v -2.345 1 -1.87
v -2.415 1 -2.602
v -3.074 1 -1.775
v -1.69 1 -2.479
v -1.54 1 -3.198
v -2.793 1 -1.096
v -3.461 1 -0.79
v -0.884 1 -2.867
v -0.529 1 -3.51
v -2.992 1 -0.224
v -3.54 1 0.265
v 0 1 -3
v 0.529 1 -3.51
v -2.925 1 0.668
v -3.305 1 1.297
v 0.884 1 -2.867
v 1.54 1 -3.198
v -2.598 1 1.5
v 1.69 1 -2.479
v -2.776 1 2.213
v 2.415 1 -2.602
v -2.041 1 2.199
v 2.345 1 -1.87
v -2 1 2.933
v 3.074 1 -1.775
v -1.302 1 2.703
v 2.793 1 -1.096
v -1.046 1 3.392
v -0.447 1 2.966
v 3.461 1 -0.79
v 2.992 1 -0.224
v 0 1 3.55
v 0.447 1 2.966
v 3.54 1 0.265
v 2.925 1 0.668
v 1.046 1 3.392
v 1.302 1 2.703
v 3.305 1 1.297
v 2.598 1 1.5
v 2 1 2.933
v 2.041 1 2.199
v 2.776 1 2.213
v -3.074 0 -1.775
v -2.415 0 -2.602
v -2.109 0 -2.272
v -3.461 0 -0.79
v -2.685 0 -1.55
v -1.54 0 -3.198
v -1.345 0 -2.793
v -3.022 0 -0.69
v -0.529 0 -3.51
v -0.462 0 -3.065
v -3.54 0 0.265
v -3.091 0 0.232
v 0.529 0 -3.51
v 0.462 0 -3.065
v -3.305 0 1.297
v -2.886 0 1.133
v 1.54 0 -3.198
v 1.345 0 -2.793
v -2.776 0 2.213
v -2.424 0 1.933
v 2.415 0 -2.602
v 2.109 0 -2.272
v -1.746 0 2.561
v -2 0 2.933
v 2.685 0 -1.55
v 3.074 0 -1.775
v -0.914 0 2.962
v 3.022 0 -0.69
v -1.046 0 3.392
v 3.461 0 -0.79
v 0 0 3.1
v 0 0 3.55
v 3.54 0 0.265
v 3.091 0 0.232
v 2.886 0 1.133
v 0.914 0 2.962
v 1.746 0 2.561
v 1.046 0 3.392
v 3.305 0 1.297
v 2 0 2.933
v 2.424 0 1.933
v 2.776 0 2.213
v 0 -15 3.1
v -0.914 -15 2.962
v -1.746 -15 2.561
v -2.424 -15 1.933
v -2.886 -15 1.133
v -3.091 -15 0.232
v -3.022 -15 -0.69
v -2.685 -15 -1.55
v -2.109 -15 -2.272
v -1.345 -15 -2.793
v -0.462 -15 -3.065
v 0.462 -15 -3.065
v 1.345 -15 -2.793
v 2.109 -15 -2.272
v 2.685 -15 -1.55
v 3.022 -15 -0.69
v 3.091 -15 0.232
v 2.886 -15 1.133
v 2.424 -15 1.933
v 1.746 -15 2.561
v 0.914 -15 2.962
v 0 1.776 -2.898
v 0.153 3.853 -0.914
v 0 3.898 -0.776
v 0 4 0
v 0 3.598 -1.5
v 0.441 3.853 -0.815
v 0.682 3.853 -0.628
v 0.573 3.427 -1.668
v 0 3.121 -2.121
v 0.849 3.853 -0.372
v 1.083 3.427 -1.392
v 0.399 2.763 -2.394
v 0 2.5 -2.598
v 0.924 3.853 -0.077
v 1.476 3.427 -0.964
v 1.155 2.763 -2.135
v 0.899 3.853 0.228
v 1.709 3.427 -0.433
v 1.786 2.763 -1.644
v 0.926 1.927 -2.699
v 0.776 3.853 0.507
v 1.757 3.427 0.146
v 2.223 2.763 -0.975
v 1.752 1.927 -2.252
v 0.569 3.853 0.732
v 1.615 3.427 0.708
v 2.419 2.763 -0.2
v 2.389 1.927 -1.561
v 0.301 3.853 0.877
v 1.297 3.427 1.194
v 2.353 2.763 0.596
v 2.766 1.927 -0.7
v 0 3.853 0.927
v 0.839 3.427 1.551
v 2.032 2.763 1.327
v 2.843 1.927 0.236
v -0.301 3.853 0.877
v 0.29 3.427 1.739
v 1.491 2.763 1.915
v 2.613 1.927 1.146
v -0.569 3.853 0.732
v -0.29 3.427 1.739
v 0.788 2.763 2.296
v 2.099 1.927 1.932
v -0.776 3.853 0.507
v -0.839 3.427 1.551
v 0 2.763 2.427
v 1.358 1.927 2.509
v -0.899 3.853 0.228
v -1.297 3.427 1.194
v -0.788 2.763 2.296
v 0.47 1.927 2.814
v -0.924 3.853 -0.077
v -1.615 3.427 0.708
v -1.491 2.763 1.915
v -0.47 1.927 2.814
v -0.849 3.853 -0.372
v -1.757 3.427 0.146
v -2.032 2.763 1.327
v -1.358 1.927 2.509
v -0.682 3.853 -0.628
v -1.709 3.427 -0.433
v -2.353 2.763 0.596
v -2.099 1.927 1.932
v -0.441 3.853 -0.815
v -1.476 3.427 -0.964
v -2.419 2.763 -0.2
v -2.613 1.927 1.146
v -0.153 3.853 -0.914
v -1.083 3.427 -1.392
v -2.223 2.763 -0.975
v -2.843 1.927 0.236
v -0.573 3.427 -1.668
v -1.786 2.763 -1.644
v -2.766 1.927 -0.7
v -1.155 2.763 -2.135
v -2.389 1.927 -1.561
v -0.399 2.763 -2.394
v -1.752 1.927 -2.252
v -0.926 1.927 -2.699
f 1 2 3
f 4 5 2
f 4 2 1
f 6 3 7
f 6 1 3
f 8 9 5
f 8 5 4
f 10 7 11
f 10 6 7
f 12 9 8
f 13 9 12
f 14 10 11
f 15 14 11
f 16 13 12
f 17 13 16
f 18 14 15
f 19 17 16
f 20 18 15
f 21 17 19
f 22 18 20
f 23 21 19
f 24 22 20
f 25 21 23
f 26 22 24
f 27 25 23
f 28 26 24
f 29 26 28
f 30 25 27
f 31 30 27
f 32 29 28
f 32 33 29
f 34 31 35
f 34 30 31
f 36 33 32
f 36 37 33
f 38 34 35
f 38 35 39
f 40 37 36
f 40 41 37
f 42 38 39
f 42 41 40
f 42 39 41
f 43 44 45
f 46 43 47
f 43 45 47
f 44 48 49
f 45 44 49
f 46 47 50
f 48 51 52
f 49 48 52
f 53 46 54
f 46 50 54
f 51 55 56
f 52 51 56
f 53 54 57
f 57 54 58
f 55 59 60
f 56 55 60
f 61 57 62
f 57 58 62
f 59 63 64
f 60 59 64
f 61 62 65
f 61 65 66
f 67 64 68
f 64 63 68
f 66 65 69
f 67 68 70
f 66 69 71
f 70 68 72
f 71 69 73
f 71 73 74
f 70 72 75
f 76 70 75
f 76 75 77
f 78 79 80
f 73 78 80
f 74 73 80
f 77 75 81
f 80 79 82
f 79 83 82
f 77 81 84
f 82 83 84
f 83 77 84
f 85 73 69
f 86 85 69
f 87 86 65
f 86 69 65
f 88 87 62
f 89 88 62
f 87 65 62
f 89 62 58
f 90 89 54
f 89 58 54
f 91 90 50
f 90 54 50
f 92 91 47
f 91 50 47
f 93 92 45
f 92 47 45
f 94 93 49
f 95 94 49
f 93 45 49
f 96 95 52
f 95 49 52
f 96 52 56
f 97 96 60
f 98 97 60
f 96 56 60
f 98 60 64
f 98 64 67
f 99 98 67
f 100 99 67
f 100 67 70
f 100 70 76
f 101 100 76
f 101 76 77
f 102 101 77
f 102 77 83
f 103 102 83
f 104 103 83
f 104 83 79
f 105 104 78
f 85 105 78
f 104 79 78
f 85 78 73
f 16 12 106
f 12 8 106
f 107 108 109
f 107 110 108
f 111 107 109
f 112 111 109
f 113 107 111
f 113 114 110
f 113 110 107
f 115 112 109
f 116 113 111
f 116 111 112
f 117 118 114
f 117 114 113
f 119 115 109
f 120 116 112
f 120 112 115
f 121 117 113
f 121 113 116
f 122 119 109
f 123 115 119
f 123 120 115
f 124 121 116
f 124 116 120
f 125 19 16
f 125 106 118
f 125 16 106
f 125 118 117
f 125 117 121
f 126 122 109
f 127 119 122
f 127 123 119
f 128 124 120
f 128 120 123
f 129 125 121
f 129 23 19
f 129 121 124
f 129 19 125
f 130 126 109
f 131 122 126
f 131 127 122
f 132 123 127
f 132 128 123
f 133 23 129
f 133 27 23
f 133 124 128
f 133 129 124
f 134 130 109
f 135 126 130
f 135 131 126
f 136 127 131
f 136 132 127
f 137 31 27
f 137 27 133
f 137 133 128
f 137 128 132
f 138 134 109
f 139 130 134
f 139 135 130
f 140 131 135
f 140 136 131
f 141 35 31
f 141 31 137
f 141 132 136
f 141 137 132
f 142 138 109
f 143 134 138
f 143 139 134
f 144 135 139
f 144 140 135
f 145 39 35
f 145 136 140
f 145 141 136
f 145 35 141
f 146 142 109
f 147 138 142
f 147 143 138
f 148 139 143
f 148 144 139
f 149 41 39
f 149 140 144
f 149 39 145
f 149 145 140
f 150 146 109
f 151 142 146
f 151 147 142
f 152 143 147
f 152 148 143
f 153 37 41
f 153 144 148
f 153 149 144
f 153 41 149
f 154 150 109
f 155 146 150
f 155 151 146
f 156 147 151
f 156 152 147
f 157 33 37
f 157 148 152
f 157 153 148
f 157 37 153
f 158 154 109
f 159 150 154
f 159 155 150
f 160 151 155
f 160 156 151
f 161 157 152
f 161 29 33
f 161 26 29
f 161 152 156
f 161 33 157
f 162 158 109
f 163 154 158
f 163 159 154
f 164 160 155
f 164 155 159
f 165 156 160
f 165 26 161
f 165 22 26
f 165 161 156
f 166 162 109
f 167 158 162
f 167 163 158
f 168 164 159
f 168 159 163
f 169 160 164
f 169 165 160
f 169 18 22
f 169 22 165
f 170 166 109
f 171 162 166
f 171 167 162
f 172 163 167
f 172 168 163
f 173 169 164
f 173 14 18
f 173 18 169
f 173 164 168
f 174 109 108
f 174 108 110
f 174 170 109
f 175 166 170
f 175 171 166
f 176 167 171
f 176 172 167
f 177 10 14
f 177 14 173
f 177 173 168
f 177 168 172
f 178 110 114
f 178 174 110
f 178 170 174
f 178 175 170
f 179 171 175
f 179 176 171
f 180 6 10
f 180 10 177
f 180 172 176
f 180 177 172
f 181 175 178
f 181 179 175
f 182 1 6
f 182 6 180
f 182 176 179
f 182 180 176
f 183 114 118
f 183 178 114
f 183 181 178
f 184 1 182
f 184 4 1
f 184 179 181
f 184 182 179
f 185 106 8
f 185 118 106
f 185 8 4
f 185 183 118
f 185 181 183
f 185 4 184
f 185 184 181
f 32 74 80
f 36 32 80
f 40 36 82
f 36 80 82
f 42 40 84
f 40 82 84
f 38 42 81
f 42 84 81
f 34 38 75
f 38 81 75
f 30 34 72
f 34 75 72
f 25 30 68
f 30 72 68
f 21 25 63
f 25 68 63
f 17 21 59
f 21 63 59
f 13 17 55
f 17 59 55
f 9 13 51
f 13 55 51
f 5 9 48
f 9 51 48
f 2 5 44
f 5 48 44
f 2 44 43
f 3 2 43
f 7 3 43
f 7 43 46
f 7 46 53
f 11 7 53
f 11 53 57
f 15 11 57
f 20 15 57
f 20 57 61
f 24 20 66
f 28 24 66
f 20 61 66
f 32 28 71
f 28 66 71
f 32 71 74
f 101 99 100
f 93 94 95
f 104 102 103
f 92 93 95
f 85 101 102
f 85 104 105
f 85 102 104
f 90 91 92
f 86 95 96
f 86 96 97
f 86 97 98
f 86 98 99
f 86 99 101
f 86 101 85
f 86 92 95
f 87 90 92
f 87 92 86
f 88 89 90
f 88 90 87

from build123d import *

# Parameters (mm, degrees)
SKETCH1_R           = 3.55
BOSS_EXTRUDE1_DEPTH = 1
SKETCH3_R           = 3.1
BOSS_EXTRUDE2_DEPTH = 15


with BuildPart() as part:
    # Sketch1 → Boss-Extrude1 (new body)
    with BuildSketch(Plane(origin=(0, 0, 0), x_dir=(1, 0, 0), z_dir=(0, 1, 0))):
        Circle(SKETCH1_R)
    extrude(amount=BOSS_EXTRUDE1_DEPTH)

    # Sketch2 → Revolve1 (revolve)
    with BuildSketch(Plane(origin=(0, 0, 0), x_dir=(0, 0, -1), z_dir=(1, 0, 0))):
        with BuildLine():
            Line((0, 1), (0, 4))
            ThreePointArc((0, 4), (2.121320344, 3.121320344), (3, 1))
            Line((3, 1), (0, 1))
        make_face()
    revolve(axis=Axis((0, 1, 0), (0, -1, 0)))

    # Sketch3 → Boss-Extrude2 (add)
    with BuildSketch(Plane.XZ):
        Circle(SKETCH3_R)
    extrude(amount=BOSS_EXTRUDE2_DEPTH)


solid = part.part
